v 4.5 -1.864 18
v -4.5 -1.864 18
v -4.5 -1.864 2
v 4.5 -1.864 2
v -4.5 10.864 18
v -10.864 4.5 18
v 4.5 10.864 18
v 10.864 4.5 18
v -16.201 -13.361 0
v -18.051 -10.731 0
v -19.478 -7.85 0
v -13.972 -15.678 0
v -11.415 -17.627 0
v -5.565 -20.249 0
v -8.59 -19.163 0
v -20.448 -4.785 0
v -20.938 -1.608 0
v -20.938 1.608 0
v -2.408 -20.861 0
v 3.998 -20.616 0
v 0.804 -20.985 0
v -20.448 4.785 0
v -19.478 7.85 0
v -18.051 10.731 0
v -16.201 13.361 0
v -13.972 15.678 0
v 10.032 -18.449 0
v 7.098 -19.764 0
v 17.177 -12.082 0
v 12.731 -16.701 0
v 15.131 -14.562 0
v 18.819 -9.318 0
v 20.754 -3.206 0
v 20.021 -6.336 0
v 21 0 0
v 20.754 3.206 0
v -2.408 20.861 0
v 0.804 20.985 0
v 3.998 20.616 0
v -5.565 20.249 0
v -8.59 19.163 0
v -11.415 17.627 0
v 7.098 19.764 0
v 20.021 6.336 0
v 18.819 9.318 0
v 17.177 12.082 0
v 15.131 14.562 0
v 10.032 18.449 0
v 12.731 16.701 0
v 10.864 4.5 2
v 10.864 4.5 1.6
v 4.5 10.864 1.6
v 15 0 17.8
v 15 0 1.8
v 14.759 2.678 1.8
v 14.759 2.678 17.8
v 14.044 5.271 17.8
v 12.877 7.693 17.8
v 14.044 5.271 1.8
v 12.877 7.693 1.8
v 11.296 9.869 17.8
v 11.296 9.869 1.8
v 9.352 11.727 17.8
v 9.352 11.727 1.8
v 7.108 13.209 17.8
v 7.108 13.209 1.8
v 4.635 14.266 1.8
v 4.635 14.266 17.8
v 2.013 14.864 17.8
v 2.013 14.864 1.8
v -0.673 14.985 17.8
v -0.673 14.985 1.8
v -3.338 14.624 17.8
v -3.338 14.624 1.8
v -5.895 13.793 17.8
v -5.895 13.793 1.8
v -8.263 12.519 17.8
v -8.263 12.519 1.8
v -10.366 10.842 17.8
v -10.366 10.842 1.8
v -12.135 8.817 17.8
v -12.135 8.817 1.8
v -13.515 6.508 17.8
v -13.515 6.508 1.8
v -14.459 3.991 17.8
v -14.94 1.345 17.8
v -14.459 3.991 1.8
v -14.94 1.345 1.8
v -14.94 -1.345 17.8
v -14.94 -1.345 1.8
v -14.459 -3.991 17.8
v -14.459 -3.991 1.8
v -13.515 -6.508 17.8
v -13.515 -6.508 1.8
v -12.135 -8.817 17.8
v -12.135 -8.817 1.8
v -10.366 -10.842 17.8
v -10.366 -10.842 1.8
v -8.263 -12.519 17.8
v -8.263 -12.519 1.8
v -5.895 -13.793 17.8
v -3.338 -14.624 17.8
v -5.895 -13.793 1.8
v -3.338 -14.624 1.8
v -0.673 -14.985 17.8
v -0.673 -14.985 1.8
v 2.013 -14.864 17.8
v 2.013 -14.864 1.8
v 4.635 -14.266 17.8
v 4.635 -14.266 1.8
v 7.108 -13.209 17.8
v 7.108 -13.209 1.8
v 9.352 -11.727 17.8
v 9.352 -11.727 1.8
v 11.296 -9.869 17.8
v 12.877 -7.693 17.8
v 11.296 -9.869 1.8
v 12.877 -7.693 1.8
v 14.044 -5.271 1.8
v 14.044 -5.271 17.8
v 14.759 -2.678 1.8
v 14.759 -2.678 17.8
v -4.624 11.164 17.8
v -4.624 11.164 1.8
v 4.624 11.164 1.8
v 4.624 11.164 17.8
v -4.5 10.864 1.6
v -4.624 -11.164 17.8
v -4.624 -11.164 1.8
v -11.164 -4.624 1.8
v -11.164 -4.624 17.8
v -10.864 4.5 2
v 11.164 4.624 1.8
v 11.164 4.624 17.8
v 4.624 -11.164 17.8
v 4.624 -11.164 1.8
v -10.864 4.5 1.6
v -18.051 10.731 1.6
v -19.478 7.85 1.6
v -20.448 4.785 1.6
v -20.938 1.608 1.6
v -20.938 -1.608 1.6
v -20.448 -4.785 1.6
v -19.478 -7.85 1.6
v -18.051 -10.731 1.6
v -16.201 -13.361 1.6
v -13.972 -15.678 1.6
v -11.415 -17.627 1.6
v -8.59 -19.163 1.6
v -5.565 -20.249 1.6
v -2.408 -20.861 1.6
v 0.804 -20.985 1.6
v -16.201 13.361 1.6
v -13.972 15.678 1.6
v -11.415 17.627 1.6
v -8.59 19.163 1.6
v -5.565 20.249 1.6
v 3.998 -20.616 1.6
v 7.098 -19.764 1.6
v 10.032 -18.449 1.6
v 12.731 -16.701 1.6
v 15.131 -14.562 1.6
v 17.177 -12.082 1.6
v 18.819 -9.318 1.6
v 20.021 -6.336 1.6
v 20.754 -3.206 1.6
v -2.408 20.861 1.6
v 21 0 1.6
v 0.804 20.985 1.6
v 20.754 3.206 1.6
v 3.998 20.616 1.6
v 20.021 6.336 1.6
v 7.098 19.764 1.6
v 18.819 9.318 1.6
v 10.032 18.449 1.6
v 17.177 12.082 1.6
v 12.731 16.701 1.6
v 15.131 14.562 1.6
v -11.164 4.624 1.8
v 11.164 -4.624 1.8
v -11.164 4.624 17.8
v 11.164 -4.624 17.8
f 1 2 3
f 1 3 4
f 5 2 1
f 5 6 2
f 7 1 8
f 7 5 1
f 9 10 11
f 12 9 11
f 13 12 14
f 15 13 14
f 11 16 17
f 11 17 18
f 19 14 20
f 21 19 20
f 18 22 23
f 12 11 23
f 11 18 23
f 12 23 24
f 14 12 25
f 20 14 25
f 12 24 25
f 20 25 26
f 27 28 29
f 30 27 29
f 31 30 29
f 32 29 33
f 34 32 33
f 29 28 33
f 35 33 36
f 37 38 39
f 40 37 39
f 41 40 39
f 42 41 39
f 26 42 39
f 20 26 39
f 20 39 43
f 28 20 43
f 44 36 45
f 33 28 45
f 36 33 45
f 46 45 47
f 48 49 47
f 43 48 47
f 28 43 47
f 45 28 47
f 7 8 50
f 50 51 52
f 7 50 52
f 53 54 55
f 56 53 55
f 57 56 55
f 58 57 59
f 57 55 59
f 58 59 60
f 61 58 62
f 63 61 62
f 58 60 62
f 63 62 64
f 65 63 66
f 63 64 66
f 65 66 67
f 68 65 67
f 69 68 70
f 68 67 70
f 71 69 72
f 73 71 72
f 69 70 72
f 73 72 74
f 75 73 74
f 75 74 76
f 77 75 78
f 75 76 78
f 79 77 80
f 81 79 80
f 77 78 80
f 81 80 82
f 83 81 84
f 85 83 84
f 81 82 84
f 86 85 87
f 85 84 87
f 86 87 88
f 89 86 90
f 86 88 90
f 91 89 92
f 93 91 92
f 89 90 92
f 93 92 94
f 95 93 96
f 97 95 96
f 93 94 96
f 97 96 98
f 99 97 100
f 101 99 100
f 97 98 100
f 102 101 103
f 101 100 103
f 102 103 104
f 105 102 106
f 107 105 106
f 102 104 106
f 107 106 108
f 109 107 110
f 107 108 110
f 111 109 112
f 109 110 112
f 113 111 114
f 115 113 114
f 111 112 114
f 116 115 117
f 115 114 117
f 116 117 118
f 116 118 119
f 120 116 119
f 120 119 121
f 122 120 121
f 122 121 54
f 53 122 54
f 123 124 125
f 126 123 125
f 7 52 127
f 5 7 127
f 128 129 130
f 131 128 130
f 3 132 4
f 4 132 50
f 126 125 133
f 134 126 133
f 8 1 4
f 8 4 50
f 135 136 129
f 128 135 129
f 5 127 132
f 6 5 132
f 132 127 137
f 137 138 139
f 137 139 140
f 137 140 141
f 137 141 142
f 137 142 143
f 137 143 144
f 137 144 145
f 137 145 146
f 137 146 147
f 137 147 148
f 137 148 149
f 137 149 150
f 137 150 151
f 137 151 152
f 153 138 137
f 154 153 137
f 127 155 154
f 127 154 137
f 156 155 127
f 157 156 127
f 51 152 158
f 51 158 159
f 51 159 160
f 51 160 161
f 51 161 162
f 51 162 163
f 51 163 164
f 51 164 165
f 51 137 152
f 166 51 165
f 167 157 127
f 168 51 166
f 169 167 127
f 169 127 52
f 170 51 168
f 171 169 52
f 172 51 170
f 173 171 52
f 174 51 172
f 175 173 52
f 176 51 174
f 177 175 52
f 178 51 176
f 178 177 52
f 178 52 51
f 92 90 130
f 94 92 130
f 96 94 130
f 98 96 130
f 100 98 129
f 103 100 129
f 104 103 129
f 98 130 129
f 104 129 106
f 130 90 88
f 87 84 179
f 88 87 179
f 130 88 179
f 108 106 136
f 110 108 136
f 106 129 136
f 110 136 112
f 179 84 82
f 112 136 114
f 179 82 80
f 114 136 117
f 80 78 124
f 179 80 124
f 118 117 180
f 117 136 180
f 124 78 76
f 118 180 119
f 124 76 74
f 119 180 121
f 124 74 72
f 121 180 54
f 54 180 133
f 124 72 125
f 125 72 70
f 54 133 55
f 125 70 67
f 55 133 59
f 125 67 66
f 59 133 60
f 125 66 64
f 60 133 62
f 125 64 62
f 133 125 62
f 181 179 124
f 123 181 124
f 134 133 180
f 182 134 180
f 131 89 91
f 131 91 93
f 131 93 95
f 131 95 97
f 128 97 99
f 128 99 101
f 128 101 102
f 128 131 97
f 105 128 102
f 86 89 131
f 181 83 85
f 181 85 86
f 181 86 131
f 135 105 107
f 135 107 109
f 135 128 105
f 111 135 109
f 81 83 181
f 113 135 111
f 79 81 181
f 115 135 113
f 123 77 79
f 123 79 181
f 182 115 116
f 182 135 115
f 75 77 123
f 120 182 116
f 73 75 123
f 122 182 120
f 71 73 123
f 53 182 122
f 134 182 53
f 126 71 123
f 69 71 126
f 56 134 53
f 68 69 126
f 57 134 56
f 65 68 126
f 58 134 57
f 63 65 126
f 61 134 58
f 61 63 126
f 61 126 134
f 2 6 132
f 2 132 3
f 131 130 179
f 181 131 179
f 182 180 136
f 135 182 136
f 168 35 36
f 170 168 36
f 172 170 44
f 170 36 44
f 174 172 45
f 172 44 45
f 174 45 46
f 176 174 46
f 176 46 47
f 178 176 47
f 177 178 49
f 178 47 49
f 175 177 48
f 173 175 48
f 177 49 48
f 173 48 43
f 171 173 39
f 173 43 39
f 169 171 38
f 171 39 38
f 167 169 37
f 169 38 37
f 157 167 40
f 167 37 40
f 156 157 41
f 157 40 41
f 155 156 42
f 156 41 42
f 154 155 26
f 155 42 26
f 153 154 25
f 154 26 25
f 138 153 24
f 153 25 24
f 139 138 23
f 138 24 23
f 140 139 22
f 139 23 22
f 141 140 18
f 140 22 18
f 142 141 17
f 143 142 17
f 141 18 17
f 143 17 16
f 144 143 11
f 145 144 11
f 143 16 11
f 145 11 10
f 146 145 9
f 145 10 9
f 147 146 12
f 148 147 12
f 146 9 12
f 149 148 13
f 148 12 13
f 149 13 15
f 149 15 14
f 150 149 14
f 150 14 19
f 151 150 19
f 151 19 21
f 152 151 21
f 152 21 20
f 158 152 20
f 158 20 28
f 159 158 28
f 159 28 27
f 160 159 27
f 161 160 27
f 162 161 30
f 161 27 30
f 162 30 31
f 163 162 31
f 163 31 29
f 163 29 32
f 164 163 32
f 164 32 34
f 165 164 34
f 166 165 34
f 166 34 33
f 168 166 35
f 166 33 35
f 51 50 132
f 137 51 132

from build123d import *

# Parameters (mm, degrees)
F0_R     = 21
F1_DEPTH = 1.6
F3_DEPTH = 16.4
F5_START = 0.2
F4_R     = 15
F4_R_2   = 13.8
F5_DEPTH = 16
F7_DEPTH = 16.4
F9_DEPTH = 16


with BuildPart() as f1:
    # F0 (on Top) → F1 (new body)
    with BuildSketch(Plane.XY):
        Circle(F0_R)
    extrude(amount=F1_DEPTH)

    # F2 (on face) → F3 (join)
    with BuildSketch(Plane.XY.offset(1.6)):
        Polygon((10.8639610307, -4.5), (10.8639610307, 4.5), (4.5, 10.8639610307), (-4.5, 10.8639610307), (-10.8639610307, 4.5), (-10.8639610307, -4.5), (-4.5, -10.8639610307), (4.5, -10.8639610307), align=None)
    extrude(amount=F3_DEPTH)

    # F6 (on face) → F7 (cut, through all)
    with BuildSketch(Plane.XY.offset(18)):
        Polygon((10.8639610307, 4.5), (-10.8639610307, 4.5), (-10.8639610307, -4.5), (-4.5, -10.8639610307), (4.5, -10.8639610307), (10.8639610307, -4.5), align=None)
    extrude(amount=-F7_DEPTH, mode=Mode.SUBTRACT)

    # F8 (on face) → F9 (join)
    with BuildSketch(Plane.XY.offset(18)):
        Polygon((-4.5, 4.5), (-4.5, -1.8639610307), (4.5, -1.8639610307), (10.8639610307, 4.5), align=None)
        Polygon((-4.5, 4.5), (-10.8639610307, 4.5), (-4.5, -1.8639610307), align=None)
    extrude(amount=-F9_DEPTH)


with BuildPart() as f5:
    # F4 (on face) → F5 (new body)
    with BuildSketch(Plane.XY.offset(1.6).offset(F5_START)):
        Circle(F4_R)
        Circle(F4_R_2, mode=Mode.SUBTRACT)
        Circle(F4_R_2)
        Polygon((-11.1639610307, 4.6242640687), (-4.6242640687, 11.1639610307), (4.6242640687, 11.1639610307), (11.1639610307, 4.6242640687), (11.1639610307, -4.6242640687), (4.6242640687, -11.1639610307), (-4.6242640687, -11.1639610307), (-11.1639610307, -4.6242640687), align=None, mode=Mode.SUBTRACT)
    extrude(amount=F5_DEPTH)


solid = Compound([f1.part, f5.part])
